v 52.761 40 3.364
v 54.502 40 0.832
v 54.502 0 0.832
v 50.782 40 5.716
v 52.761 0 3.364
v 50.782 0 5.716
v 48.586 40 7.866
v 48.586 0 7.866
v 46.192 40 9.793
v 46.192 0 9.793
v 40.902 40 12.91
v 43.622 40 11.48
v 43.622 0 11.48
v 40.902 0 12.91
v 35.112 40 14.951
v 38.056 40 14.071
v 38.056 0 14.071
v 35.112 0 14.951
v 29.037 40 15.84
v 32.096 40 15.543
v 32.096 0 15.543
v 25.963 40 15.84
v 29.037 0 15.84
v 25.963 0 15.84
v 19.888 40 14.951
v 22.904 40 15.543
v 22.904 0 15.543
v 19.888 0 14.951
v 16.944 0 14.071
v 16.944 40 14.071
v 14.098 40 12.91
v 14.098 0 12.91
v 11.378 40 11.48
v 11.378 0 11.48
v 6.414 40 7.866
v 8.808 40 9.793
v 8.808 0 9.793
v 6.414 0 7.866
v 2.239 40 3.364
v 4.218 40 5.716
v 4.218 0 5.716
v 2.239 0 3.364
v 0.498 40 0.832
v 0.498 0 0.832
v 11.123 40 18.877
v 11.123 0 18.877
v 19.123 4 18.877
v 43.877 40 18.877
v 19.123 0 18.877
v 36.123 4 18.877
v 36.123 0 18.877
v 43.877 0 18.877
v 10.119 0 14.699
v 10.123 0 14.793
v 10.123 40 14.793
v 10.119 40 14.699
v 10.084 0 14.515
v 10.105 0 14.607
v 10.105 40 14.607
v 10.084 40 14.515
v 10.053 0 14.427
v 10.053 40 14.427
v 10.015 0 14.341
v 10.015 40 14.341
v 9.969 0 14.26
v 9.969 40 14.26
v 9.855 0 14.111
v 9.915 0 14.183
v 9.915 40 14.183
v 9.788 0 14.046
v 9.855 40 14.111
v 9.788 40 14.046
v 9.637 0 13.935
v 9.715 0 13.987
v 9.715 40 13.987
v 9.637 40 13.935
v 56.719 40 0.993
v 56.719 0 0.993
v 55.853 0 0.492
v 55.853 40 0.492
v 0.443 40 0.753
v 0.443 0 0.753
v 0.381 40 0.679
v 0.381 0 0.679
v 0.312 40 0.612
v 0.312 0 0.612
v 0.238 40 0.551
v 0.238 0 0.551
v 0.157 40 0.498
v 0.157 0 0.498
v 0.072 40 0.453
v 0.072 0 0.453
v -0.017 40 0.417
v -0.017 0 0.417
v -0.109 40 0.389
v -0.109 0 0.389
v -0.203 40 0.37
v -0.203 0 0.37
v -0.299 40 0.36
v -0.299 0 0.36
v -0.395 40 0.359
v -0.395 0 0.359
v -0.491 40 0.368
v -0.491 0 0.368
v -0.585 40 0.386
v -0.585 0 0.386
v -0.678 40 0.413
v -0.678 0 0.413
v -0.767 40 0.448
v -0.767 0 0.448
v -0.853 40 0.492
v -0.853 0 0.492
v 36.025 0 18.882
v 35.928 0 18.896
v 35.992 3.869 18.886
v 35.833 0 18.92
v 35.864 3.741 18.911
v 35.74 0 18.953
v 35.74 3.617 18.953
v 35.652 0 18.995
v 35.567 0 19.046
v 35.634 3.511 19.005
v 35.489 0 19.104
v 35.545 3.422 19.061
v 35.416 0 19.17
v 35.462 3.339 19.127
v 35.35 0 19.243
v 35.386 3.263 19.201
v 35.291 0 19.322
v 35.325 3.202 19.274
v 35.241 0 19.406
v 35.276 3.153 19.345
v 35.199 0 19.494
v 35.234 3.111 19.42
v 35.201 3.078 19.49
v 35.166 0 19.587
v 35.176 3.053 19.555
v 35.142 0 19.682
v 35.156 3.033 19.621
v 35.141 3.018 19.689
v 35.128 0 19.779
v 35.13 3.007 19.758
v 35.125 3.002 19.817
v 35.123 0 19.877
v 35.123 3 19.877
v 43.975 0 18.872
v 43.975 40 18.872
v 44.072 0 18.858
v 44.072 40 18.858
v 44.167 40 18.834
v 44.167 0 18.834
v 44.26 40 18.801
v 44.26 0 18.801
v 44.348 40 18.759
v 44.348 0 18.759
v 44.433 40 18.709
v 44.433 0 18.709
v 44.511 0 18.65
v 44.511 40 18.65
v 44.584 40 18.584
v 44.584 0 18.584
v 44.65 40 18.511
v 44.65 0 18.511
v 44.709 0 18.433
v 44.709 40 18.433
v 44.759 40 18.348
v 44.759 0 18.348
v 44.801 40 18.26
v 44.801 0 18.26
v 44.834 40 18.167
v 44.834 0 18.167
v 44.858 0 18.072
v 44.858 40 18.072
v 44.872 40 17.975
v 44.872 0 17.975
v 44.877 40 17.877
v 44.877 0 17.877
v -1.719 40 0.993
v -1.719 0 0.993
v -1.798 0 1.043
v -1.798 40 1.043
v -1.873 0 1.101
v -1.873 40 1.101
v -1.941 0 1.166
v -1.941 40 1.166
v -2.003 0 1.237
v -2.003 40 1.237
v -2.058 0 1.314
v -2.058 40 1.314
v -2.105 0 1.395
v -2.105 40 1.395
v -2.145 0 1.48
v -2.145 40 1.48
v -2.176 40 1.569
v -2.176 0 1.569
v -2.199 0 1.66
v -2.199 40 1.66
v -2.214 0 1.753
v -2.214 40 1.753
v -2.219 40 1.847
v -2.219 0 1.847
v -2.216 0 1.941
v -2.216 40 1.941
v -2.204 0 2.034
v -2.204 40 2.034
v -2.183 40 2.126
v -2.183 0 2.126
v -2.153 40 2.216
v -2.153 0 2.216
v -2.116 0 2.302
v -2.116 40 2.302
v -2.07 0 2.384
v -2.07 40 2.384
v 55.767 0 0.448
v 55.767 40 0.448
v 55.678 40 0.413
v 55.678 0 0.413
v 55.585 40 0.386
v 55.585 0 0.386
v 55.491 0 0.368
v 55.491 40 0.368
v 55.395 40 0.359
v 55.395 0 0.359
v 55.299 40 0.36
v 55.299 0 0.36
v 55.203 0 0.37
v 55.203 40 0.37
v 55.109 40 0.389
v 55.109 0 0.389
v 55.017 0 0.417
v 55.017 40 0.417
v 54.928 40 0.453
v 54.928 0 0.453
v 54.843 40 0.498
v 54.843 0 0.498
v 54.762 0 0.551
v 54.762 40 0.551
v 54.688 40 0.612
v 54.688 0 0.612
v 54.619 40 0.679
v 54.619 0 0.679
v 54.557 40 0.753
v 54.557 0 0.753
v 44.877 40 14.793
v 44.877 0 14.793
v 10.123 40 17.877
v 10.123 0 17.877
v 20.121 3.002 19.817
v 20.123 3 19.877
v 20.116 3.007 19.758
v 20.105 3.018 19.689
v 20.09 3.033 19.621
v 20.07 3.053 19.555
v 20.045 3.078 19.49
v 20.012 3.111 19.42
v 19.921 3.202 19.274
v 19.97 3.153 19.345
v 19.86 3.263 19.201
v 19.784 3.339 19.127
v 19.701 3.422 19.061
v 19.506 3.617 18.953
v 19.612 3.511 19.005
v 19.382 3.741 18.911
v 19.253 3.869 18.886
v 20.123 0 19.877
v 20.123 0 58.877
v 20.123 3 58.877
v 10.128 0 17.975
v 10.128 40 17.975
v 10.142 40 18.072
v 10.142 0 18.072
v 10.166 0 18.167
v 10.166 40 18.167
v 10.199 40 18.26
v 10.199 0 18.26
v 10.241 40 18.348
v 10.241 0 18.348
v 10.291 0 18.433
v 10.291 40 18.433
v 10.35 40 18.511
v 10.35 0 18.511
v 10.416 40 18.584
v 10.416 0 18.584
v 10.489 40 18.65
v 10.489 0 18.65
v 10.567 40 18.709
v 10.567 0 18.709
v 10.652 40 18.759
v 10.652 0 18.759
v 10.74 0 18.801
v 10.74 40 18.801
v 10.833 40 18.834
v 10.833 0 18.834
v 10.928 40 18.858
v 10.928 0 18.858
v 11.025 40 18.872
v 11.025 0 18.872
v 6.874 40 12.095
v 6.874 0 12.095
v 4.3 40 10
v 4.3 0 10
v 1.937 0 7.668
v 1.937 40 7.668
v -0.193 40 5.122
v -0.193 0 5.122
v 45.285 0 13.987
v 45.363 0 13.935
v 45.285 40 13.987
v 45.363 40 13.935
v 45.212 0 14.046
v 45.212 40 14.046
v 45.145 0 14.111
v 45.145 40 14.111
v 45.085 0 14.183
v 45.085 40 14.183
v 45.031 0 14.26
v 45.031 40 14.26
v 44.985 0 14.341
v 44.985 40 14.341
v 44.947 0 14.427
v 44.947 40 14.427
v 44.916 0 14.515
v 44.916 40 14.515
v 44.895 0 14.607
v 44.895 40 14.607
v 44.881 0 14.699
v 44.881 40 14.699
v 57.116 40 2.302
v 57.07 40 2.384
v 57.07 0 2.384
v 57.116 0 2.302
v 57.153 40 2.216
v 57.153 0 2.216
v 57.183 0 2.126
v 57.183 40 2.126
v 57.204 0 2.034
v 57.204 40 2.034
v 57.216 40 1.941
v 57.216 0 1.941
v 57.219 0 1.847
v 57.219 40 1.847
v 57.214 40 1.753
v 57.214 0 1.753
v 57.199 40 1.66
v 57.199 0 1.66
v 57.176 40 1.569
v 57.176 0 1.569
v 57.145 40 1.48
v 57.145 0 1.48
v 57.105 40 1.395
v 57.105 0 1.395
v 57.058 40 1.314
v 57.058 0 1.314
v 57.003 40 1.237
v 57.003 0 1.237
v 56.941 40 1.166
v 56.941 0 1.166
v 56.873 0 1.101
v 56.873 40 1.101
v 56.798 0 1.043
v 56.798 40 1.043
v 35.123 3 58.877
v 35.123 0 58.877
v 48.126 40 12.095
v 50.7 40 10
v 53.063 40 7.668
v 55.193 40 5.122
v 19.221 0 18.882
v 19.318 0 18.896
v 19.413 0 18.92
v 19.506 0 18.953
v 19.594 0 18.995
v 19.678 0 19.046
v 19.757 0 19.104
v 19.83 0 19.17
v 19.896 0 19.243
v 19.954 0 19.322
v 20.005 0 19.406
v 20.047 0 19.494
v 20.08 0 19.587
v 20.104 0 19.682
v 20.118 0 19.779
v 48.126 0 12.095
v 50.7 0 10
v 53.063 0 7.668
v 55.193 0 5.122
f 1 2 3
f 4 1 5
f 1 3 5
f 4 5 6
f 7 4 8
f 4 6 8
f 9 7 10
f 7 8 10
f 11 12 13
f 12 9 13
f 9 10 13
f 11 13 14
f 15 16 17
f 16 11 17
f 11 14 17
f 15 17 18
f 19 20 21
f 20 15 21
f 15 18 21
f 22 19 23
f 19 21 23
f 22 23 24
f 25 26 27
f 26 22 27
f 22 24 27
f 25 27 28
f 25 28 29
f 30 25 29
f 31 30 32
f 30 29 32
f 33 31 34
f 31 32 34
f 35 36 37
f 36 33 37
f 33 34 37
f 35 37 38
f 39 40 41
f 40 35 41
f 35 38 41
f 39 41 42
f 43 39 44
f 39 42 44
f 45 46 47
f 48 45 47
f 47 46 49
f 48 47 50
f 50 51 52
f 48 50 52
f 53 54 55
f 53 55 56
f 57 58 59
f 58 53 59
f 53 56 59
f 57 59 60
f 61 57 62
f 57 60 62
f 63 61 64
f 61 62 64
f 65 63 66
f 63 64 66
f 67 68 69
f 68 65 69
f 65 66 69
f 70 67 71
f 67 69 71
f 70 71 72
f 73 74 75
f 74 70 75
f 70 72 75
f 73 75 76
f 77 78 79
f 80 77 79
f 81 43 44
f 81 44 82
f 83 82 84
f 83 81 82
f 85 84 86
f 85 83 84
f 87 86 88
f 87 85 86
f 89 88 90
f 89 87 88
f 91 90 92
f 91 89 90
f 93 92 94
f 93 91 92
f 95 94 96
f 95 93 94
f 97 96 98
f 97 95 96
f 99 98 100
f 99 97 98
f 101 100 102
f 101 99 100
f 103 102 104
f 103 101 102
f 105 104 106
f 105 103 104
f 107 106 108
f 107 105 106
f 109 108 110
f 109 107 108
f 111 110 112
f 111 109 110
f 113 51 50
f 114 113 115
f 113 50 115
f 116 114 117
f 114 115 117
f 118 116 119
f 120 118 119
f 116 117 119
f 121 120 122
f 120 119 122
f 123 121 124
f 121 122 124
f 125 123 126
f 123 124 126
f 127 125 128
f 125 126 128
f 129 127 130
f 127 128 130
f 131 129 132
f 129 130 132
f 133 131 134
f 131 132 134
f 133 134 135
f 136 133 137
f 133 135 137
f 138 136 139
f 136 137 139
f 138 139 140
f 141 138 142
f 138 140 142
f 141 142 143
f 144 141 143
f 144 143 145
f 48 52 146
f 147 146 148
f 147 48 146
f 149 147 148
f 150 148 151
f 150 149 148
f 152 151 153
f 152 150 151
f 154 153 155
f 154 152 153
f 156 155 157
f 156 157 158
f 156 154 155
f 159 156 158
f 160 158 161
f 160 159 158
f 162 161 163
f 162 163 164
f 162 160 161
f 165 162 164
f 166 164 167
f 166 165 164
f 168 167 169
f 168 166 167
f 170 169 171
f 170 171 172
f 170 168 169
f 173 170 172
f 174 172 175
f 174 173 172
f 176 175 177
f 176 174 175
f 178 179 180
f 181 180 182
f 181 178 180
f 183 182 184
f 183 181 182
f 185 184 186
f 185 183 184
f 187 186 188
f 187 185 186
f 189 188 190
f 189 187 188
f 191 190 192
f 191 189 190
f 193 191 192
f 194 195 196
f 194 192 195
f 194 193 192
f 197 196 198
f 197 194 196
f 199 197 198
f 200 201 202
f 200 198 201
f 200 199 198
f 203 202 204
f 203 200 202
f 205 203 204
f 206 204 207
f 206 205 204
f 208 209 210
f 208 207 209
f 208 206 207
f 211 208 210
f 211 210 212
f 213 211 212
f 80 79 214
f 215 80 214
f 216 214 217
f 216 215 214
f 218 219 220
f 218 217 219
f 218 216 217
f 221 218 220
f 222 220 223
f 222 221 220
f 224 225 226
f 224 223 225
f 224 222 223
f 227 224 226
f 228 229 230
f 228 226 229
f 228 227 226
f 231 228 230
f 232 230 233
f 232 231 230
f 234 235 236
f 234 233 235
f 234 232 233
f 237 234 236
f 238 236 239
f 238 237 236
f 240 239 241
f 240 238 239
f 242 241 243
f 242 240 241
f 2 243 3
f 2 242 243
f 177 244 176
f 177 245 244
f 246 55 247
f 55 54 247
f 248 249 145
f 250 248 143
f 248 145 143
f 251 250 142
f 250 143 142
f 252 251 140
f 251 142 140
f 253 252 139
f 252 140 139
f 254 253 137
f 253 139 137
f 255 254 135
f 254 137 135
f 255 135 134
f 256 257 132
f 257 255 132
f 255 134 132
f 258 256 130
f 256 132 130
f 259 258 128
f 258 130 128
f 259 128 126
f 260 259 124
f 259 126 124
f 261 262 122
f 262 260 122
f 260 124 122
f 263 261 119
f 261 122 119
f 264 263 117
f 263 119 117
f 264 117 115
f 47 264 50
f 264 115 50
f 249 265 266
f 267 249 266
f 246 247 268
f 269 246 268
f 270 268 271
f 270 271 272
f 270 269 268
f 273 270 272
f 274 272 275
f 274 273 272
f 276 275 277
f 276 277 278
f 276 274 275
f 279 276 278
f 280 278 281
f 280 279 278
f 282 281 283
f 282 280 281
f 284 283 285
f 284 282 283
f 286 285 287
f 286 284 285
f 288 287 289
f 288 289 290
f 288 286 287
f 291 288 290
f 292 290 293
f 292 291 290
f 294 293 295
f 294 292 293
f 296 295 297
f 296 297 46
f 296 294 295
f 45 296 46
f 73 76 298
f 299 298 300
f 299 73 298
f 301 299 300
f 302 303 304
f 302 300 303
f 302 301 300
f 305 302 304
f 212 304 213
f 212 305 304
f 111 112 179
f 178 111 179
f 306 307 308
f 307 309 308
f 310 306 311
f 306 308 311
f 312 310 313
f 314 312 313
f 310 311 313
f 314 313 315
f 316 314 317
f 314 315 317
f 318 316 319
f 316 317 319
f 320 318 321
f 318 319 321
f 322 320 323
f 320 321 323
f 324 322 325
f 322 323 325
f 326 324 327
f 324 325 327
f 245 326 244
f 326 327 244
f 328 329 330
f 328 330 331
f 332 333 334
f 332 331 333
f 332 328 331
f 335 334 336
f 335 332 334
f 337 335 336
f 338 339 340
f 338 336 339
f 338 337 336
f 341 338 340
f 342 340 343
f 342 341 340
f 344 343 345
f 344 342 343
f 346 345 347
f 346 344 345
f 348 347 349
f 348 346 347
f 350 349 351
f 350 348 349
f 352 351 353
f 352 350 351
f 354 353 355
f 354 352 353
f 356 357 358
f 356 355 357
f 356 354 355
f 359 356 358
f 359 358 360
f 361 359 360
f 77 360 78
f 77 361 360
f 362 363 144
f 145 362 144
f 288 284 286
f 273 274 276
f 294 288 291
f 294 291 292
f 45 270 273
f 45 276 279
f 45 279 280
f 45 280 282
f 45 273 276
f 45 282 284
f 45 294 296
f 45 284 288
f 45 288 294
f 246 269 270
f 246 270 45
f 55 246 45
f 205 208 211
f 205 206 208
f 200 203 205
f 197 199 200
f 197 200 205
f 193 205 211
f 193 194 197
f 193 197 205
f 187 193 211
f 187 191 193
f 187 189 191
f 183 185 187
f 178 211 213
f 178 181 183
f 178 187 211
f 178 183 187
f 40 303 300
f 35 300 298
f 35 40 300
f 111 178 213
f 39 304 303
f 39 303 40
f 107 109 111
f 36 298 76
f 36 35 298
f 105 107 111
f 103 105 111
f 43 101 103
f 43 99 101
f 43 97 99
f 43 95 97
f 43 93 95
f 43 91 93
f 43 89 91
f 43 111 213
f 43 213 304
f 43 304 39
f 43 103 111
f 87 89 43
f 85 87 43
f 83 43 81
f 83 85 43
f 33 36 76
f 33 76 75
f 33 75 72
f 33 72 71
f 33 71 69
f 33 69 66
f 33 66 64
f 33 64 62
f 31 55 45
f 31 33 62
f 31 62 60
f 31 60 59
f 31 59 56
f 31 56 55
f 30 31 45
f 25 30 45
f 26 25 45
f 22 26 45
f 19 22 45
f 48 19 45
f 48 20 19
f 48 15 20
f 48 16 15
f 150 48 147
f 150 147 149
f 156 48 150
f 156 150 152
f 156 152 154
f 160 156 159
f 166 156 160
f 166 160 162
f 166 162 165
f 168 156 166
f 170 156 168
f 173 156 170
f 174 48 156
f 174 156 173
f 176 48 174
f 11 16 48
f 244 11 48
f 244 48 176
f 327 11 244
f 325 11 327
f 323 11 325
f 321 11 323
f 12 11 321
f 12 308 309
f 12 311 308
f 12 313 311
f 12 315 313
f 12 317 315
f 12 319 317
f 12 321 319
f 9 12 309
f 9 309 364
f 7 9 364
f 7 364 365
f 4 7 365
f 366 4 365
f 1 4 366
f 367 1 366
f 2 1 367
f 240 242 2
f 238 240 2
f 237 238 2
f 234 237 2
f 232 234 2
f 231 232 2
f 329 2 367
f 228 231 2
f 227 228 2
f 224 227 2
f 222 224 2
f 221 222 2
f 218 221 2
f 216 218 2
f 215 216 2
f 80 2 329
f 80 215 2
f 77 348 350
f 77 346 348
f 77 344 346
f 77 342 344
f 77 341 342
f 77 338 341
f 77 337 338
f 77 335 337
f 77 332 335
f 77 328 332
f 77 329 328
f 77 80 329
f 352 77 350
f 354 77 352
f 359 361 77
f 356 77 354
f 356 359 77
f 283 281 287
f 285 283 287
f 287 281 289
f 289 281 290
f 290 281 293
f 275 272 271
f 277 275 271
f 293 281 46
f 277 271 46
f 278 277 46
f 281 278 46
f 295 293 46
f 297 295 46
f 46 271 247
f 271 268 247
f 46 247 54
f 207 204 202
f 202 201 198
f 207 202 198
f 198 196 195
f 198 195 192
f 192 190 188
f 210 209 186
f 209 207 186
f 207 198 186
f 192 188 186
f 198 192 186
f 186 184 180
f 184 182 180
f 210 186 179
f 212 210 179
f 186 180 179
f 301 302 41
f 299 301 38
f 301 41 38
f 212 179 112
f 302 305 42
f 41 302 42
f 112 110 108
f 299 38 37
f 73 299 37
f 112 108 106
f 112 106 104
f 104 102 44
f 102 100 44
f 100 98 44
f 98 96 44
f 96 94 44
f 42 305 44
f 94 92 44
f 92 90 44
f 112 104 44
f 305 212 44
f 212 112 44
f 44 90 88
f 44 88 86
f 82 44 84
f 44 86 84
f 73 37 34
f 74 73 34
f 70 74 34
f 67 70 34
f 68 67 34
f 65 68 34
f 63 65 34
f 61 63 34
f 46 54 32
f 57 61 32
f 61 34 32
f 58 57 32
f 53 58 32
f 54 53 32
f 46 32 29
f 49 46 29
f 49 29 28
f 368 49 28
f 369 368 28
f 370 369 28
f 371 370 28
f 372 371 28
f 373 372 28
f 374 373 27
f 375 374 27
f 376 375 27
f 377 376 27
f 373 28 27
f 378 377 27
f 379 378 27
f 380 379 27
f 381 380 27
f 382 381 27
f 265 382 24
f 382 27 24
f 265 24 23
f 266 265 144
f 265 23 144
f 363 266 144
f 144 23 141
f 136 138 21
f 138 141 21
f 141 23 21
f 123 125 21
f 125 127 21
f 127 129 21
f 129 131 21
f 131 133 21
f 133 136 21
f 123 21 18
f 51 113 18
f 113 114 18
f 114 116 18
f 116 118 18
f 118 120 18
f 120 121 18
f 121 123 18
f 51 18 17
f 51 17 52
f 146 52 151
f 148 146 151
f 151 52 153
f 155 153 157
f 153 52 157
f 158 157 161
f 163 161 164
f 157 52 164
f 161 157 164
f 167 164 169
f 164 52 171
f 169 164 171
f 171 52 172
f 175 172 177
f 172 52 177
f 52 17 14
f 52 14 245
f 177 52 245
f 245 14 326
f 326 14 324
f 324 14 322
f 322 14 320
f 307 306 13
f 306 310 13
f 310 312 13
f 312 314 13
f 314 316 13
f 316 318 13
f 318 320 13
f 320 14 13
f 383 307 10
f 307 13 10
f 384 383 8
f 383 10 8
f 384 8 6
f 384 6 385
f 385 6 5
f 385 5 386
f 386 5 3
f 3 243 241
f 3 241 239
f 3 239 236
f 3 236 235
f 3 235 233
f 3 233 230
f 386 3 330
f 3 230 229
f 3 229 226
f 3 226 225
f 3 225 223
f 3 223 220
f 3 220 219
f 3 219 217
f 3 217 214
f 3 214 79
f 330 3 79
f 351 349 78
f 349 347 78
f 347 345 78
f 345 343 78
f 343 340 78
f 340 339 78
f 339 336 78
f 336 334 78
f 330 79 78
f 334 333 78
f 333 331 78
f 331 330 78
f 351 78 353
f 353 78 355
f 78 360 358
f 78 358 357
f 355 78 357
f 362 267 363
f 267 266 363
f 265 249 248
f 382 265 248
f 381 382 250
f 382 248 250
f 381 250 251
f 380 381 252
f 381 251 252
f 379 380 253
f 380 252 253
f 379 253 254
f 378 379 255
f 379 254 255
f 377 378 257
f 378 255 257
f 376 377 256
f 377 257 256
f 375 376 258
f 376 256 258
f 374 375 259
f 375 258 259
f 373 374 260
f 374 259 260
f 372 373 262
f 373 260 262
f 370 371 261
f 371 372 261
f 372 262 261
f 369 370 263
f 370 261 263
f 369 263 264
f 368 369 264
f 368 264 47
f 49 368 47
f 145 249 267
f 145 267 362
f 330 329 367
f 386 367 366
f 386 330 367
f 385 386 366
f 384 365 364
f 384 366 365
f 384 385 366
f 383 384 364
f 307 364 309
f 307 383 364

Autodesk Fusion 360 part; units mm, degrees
sketch "Sketch2" plane through (0, 0, 0) normal (0, 1, 0) x (1, 0, 0)
  arc A0 (0, 0) -> (55, 0) centre (27.5, 15.8771) ccw
  line L0 (0, 0) -> (27.5, 15.8771) construction
  line L1 (27.5, 15.8771) -> (55, 0) construction
  arc A1 (-2.5981, -1.5) -> (57.5981, -1.5) centre (27.5, 15.8771) ccw
  line L2 (0, 0) -> (-2.5981, -1.5)
  line L3 (57.5981, -1.5) -> (55, 0)
  line L4 (27.5, 15.8771) -> (27.5, -52.8095) construction
  line L5 (27.5, 15.8771) -> (10.1229, -14.2209) construction
  line L6 (27.5, 15.8771) -> (44.8771, -14.2209) construction
  line L7 (10.1229, -18.8771) -> (44.8771, -18.8771)
  line L8 (44.8771, -14.2209) -> (44.8771, -18.8771)
  line L9 (10.1229, -14.2209) -> (10.1229, -18.8771)
  line L10 (20.1229, -18.8771) -> (20.1229, -58.8771)
  line L11 (20.1229, -58.8771) -> (35.1229, -58.8771)
  line L12 (35.1229, -58.8771) -> (35.1229, -18.8771)
  dimension "d2" = 55
  dimension "d3" = 120
  dimension "d4" = 3
  dimension "d7" = 30
  dimension "d24" = 30
  dimension "d25" = 40
  dimension "d26" = 10
  dimension "d27" = 15
extrude "Extrude4" add sketch "Sketch2" along normal blind 40 contours A0 A1 L2 L3 | A1 L7 L9 | A1 L7 L8
extrude "Extrude5" add sketch "Sketch2" along normal blind 3 contours L7 L10 L11 L12
fillet "Fillet1" radius 1 7 edges at (10.1229, 20, 14.2209) (10.1229, 20, 18.8771) (44.8771, 20, 18.8771) (44.8771, 20, 14.2209) (27.6229, 3, 18.8771) (35.1229, 1.5, 18.8771) (20.1229, 1.5, 18.8771)
fillet "Fillet2" radius 1 4 edges at (57.5981, 20, 1.5) (55, 20, 0) (-2.5981, 20, 1.5) (0, 20, 0)
